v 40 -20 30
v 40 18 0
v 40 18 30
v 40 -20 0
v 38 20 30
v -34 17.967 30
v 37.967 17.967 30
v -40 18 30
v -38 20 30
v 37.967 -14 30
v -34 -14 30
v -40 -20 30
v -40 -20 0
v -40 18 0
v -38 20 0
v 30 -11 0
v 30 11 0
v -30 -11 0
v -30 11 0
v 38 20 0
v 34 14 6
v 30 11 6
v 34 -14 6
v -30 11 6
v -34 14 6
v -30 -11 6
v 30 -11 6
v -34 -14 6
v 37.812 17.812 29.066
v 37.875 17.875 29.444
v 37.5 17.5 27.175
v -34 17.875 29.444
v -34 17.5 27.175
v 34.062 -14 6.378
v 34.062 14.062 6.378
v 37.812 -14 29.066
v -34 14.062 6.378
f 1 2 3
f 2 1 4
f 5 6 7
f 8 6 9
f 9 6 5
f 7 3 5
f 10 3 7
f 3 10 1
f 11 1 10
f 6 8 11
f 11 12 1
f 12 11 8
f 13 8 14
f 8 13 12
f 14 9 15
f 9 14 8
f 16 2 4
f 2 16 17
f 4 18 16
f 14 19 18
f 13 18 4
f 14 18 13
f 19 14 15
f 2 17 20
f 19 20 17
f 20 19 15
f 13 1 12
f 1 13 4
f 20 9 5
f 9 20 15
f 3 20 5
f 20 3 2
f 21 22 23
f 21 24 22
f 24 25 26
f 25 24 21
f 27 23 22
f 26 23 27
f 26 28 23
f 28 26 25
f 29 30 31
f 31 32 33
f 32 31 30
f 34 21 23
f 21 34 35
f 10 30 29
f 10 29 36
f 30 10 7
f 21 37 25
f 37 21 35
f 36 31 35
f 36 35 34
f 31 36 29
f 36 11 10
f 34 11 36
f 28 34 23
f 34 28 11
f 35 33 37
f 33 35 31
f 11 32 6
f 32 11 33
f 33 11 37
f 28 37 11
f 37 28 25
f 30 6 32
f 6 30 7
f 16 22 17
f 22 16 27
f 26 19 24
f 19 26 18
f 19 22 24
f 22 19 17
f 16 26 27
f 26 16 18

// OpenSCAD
$fn=64;

L = 80;
W = 40;
H = 30;

wall = 6;
floor_t = 6;

inner_taper = 2;      // total widening from bottom to top on each inner wall face
chamfer = 2;

relief_w = 22;
relief_h = 10;
relief_len = 60;

module chamfered_block(size=[10,10,10], c=1) {
    x=size[0]; y=size[1]; z=size[2];
    c2 = min(c, min(x,y)/2);
    linear_extrude(height=z)
        polygon(points=[
            [0,0],
            [x,0],
            [x,y-c2],
            [x-c2,y],
            [c2,y],
            [0,y-c2]
        ]);
}

module u_channel() {
    difference() {
        translate([-L/2, -W/2, 0])
            chamfered_block([L,W,H], chamfer);

        // Open-top cavity with tapered inner faces
        translate([-L/2 + wall, -W/2 + wall, floor_t])
            linear_extrude(height=H - floor_t + 0.2, scale=[(L-2*wall + 2*inner_taper)/(L-2*wall), (W-2*wall + 2*inner_taper)/(W-2*wall)])
                square([L-2*wall, W-2*wall], center=false);

        // Bottom relief/notch to create bridge-like profile
        translate([-relief_len/2, -relief_w/2, -0.1])
            cube([relief_len, relief_w, relief_h + 0.2], center=false);
    }
}

u_channel();
